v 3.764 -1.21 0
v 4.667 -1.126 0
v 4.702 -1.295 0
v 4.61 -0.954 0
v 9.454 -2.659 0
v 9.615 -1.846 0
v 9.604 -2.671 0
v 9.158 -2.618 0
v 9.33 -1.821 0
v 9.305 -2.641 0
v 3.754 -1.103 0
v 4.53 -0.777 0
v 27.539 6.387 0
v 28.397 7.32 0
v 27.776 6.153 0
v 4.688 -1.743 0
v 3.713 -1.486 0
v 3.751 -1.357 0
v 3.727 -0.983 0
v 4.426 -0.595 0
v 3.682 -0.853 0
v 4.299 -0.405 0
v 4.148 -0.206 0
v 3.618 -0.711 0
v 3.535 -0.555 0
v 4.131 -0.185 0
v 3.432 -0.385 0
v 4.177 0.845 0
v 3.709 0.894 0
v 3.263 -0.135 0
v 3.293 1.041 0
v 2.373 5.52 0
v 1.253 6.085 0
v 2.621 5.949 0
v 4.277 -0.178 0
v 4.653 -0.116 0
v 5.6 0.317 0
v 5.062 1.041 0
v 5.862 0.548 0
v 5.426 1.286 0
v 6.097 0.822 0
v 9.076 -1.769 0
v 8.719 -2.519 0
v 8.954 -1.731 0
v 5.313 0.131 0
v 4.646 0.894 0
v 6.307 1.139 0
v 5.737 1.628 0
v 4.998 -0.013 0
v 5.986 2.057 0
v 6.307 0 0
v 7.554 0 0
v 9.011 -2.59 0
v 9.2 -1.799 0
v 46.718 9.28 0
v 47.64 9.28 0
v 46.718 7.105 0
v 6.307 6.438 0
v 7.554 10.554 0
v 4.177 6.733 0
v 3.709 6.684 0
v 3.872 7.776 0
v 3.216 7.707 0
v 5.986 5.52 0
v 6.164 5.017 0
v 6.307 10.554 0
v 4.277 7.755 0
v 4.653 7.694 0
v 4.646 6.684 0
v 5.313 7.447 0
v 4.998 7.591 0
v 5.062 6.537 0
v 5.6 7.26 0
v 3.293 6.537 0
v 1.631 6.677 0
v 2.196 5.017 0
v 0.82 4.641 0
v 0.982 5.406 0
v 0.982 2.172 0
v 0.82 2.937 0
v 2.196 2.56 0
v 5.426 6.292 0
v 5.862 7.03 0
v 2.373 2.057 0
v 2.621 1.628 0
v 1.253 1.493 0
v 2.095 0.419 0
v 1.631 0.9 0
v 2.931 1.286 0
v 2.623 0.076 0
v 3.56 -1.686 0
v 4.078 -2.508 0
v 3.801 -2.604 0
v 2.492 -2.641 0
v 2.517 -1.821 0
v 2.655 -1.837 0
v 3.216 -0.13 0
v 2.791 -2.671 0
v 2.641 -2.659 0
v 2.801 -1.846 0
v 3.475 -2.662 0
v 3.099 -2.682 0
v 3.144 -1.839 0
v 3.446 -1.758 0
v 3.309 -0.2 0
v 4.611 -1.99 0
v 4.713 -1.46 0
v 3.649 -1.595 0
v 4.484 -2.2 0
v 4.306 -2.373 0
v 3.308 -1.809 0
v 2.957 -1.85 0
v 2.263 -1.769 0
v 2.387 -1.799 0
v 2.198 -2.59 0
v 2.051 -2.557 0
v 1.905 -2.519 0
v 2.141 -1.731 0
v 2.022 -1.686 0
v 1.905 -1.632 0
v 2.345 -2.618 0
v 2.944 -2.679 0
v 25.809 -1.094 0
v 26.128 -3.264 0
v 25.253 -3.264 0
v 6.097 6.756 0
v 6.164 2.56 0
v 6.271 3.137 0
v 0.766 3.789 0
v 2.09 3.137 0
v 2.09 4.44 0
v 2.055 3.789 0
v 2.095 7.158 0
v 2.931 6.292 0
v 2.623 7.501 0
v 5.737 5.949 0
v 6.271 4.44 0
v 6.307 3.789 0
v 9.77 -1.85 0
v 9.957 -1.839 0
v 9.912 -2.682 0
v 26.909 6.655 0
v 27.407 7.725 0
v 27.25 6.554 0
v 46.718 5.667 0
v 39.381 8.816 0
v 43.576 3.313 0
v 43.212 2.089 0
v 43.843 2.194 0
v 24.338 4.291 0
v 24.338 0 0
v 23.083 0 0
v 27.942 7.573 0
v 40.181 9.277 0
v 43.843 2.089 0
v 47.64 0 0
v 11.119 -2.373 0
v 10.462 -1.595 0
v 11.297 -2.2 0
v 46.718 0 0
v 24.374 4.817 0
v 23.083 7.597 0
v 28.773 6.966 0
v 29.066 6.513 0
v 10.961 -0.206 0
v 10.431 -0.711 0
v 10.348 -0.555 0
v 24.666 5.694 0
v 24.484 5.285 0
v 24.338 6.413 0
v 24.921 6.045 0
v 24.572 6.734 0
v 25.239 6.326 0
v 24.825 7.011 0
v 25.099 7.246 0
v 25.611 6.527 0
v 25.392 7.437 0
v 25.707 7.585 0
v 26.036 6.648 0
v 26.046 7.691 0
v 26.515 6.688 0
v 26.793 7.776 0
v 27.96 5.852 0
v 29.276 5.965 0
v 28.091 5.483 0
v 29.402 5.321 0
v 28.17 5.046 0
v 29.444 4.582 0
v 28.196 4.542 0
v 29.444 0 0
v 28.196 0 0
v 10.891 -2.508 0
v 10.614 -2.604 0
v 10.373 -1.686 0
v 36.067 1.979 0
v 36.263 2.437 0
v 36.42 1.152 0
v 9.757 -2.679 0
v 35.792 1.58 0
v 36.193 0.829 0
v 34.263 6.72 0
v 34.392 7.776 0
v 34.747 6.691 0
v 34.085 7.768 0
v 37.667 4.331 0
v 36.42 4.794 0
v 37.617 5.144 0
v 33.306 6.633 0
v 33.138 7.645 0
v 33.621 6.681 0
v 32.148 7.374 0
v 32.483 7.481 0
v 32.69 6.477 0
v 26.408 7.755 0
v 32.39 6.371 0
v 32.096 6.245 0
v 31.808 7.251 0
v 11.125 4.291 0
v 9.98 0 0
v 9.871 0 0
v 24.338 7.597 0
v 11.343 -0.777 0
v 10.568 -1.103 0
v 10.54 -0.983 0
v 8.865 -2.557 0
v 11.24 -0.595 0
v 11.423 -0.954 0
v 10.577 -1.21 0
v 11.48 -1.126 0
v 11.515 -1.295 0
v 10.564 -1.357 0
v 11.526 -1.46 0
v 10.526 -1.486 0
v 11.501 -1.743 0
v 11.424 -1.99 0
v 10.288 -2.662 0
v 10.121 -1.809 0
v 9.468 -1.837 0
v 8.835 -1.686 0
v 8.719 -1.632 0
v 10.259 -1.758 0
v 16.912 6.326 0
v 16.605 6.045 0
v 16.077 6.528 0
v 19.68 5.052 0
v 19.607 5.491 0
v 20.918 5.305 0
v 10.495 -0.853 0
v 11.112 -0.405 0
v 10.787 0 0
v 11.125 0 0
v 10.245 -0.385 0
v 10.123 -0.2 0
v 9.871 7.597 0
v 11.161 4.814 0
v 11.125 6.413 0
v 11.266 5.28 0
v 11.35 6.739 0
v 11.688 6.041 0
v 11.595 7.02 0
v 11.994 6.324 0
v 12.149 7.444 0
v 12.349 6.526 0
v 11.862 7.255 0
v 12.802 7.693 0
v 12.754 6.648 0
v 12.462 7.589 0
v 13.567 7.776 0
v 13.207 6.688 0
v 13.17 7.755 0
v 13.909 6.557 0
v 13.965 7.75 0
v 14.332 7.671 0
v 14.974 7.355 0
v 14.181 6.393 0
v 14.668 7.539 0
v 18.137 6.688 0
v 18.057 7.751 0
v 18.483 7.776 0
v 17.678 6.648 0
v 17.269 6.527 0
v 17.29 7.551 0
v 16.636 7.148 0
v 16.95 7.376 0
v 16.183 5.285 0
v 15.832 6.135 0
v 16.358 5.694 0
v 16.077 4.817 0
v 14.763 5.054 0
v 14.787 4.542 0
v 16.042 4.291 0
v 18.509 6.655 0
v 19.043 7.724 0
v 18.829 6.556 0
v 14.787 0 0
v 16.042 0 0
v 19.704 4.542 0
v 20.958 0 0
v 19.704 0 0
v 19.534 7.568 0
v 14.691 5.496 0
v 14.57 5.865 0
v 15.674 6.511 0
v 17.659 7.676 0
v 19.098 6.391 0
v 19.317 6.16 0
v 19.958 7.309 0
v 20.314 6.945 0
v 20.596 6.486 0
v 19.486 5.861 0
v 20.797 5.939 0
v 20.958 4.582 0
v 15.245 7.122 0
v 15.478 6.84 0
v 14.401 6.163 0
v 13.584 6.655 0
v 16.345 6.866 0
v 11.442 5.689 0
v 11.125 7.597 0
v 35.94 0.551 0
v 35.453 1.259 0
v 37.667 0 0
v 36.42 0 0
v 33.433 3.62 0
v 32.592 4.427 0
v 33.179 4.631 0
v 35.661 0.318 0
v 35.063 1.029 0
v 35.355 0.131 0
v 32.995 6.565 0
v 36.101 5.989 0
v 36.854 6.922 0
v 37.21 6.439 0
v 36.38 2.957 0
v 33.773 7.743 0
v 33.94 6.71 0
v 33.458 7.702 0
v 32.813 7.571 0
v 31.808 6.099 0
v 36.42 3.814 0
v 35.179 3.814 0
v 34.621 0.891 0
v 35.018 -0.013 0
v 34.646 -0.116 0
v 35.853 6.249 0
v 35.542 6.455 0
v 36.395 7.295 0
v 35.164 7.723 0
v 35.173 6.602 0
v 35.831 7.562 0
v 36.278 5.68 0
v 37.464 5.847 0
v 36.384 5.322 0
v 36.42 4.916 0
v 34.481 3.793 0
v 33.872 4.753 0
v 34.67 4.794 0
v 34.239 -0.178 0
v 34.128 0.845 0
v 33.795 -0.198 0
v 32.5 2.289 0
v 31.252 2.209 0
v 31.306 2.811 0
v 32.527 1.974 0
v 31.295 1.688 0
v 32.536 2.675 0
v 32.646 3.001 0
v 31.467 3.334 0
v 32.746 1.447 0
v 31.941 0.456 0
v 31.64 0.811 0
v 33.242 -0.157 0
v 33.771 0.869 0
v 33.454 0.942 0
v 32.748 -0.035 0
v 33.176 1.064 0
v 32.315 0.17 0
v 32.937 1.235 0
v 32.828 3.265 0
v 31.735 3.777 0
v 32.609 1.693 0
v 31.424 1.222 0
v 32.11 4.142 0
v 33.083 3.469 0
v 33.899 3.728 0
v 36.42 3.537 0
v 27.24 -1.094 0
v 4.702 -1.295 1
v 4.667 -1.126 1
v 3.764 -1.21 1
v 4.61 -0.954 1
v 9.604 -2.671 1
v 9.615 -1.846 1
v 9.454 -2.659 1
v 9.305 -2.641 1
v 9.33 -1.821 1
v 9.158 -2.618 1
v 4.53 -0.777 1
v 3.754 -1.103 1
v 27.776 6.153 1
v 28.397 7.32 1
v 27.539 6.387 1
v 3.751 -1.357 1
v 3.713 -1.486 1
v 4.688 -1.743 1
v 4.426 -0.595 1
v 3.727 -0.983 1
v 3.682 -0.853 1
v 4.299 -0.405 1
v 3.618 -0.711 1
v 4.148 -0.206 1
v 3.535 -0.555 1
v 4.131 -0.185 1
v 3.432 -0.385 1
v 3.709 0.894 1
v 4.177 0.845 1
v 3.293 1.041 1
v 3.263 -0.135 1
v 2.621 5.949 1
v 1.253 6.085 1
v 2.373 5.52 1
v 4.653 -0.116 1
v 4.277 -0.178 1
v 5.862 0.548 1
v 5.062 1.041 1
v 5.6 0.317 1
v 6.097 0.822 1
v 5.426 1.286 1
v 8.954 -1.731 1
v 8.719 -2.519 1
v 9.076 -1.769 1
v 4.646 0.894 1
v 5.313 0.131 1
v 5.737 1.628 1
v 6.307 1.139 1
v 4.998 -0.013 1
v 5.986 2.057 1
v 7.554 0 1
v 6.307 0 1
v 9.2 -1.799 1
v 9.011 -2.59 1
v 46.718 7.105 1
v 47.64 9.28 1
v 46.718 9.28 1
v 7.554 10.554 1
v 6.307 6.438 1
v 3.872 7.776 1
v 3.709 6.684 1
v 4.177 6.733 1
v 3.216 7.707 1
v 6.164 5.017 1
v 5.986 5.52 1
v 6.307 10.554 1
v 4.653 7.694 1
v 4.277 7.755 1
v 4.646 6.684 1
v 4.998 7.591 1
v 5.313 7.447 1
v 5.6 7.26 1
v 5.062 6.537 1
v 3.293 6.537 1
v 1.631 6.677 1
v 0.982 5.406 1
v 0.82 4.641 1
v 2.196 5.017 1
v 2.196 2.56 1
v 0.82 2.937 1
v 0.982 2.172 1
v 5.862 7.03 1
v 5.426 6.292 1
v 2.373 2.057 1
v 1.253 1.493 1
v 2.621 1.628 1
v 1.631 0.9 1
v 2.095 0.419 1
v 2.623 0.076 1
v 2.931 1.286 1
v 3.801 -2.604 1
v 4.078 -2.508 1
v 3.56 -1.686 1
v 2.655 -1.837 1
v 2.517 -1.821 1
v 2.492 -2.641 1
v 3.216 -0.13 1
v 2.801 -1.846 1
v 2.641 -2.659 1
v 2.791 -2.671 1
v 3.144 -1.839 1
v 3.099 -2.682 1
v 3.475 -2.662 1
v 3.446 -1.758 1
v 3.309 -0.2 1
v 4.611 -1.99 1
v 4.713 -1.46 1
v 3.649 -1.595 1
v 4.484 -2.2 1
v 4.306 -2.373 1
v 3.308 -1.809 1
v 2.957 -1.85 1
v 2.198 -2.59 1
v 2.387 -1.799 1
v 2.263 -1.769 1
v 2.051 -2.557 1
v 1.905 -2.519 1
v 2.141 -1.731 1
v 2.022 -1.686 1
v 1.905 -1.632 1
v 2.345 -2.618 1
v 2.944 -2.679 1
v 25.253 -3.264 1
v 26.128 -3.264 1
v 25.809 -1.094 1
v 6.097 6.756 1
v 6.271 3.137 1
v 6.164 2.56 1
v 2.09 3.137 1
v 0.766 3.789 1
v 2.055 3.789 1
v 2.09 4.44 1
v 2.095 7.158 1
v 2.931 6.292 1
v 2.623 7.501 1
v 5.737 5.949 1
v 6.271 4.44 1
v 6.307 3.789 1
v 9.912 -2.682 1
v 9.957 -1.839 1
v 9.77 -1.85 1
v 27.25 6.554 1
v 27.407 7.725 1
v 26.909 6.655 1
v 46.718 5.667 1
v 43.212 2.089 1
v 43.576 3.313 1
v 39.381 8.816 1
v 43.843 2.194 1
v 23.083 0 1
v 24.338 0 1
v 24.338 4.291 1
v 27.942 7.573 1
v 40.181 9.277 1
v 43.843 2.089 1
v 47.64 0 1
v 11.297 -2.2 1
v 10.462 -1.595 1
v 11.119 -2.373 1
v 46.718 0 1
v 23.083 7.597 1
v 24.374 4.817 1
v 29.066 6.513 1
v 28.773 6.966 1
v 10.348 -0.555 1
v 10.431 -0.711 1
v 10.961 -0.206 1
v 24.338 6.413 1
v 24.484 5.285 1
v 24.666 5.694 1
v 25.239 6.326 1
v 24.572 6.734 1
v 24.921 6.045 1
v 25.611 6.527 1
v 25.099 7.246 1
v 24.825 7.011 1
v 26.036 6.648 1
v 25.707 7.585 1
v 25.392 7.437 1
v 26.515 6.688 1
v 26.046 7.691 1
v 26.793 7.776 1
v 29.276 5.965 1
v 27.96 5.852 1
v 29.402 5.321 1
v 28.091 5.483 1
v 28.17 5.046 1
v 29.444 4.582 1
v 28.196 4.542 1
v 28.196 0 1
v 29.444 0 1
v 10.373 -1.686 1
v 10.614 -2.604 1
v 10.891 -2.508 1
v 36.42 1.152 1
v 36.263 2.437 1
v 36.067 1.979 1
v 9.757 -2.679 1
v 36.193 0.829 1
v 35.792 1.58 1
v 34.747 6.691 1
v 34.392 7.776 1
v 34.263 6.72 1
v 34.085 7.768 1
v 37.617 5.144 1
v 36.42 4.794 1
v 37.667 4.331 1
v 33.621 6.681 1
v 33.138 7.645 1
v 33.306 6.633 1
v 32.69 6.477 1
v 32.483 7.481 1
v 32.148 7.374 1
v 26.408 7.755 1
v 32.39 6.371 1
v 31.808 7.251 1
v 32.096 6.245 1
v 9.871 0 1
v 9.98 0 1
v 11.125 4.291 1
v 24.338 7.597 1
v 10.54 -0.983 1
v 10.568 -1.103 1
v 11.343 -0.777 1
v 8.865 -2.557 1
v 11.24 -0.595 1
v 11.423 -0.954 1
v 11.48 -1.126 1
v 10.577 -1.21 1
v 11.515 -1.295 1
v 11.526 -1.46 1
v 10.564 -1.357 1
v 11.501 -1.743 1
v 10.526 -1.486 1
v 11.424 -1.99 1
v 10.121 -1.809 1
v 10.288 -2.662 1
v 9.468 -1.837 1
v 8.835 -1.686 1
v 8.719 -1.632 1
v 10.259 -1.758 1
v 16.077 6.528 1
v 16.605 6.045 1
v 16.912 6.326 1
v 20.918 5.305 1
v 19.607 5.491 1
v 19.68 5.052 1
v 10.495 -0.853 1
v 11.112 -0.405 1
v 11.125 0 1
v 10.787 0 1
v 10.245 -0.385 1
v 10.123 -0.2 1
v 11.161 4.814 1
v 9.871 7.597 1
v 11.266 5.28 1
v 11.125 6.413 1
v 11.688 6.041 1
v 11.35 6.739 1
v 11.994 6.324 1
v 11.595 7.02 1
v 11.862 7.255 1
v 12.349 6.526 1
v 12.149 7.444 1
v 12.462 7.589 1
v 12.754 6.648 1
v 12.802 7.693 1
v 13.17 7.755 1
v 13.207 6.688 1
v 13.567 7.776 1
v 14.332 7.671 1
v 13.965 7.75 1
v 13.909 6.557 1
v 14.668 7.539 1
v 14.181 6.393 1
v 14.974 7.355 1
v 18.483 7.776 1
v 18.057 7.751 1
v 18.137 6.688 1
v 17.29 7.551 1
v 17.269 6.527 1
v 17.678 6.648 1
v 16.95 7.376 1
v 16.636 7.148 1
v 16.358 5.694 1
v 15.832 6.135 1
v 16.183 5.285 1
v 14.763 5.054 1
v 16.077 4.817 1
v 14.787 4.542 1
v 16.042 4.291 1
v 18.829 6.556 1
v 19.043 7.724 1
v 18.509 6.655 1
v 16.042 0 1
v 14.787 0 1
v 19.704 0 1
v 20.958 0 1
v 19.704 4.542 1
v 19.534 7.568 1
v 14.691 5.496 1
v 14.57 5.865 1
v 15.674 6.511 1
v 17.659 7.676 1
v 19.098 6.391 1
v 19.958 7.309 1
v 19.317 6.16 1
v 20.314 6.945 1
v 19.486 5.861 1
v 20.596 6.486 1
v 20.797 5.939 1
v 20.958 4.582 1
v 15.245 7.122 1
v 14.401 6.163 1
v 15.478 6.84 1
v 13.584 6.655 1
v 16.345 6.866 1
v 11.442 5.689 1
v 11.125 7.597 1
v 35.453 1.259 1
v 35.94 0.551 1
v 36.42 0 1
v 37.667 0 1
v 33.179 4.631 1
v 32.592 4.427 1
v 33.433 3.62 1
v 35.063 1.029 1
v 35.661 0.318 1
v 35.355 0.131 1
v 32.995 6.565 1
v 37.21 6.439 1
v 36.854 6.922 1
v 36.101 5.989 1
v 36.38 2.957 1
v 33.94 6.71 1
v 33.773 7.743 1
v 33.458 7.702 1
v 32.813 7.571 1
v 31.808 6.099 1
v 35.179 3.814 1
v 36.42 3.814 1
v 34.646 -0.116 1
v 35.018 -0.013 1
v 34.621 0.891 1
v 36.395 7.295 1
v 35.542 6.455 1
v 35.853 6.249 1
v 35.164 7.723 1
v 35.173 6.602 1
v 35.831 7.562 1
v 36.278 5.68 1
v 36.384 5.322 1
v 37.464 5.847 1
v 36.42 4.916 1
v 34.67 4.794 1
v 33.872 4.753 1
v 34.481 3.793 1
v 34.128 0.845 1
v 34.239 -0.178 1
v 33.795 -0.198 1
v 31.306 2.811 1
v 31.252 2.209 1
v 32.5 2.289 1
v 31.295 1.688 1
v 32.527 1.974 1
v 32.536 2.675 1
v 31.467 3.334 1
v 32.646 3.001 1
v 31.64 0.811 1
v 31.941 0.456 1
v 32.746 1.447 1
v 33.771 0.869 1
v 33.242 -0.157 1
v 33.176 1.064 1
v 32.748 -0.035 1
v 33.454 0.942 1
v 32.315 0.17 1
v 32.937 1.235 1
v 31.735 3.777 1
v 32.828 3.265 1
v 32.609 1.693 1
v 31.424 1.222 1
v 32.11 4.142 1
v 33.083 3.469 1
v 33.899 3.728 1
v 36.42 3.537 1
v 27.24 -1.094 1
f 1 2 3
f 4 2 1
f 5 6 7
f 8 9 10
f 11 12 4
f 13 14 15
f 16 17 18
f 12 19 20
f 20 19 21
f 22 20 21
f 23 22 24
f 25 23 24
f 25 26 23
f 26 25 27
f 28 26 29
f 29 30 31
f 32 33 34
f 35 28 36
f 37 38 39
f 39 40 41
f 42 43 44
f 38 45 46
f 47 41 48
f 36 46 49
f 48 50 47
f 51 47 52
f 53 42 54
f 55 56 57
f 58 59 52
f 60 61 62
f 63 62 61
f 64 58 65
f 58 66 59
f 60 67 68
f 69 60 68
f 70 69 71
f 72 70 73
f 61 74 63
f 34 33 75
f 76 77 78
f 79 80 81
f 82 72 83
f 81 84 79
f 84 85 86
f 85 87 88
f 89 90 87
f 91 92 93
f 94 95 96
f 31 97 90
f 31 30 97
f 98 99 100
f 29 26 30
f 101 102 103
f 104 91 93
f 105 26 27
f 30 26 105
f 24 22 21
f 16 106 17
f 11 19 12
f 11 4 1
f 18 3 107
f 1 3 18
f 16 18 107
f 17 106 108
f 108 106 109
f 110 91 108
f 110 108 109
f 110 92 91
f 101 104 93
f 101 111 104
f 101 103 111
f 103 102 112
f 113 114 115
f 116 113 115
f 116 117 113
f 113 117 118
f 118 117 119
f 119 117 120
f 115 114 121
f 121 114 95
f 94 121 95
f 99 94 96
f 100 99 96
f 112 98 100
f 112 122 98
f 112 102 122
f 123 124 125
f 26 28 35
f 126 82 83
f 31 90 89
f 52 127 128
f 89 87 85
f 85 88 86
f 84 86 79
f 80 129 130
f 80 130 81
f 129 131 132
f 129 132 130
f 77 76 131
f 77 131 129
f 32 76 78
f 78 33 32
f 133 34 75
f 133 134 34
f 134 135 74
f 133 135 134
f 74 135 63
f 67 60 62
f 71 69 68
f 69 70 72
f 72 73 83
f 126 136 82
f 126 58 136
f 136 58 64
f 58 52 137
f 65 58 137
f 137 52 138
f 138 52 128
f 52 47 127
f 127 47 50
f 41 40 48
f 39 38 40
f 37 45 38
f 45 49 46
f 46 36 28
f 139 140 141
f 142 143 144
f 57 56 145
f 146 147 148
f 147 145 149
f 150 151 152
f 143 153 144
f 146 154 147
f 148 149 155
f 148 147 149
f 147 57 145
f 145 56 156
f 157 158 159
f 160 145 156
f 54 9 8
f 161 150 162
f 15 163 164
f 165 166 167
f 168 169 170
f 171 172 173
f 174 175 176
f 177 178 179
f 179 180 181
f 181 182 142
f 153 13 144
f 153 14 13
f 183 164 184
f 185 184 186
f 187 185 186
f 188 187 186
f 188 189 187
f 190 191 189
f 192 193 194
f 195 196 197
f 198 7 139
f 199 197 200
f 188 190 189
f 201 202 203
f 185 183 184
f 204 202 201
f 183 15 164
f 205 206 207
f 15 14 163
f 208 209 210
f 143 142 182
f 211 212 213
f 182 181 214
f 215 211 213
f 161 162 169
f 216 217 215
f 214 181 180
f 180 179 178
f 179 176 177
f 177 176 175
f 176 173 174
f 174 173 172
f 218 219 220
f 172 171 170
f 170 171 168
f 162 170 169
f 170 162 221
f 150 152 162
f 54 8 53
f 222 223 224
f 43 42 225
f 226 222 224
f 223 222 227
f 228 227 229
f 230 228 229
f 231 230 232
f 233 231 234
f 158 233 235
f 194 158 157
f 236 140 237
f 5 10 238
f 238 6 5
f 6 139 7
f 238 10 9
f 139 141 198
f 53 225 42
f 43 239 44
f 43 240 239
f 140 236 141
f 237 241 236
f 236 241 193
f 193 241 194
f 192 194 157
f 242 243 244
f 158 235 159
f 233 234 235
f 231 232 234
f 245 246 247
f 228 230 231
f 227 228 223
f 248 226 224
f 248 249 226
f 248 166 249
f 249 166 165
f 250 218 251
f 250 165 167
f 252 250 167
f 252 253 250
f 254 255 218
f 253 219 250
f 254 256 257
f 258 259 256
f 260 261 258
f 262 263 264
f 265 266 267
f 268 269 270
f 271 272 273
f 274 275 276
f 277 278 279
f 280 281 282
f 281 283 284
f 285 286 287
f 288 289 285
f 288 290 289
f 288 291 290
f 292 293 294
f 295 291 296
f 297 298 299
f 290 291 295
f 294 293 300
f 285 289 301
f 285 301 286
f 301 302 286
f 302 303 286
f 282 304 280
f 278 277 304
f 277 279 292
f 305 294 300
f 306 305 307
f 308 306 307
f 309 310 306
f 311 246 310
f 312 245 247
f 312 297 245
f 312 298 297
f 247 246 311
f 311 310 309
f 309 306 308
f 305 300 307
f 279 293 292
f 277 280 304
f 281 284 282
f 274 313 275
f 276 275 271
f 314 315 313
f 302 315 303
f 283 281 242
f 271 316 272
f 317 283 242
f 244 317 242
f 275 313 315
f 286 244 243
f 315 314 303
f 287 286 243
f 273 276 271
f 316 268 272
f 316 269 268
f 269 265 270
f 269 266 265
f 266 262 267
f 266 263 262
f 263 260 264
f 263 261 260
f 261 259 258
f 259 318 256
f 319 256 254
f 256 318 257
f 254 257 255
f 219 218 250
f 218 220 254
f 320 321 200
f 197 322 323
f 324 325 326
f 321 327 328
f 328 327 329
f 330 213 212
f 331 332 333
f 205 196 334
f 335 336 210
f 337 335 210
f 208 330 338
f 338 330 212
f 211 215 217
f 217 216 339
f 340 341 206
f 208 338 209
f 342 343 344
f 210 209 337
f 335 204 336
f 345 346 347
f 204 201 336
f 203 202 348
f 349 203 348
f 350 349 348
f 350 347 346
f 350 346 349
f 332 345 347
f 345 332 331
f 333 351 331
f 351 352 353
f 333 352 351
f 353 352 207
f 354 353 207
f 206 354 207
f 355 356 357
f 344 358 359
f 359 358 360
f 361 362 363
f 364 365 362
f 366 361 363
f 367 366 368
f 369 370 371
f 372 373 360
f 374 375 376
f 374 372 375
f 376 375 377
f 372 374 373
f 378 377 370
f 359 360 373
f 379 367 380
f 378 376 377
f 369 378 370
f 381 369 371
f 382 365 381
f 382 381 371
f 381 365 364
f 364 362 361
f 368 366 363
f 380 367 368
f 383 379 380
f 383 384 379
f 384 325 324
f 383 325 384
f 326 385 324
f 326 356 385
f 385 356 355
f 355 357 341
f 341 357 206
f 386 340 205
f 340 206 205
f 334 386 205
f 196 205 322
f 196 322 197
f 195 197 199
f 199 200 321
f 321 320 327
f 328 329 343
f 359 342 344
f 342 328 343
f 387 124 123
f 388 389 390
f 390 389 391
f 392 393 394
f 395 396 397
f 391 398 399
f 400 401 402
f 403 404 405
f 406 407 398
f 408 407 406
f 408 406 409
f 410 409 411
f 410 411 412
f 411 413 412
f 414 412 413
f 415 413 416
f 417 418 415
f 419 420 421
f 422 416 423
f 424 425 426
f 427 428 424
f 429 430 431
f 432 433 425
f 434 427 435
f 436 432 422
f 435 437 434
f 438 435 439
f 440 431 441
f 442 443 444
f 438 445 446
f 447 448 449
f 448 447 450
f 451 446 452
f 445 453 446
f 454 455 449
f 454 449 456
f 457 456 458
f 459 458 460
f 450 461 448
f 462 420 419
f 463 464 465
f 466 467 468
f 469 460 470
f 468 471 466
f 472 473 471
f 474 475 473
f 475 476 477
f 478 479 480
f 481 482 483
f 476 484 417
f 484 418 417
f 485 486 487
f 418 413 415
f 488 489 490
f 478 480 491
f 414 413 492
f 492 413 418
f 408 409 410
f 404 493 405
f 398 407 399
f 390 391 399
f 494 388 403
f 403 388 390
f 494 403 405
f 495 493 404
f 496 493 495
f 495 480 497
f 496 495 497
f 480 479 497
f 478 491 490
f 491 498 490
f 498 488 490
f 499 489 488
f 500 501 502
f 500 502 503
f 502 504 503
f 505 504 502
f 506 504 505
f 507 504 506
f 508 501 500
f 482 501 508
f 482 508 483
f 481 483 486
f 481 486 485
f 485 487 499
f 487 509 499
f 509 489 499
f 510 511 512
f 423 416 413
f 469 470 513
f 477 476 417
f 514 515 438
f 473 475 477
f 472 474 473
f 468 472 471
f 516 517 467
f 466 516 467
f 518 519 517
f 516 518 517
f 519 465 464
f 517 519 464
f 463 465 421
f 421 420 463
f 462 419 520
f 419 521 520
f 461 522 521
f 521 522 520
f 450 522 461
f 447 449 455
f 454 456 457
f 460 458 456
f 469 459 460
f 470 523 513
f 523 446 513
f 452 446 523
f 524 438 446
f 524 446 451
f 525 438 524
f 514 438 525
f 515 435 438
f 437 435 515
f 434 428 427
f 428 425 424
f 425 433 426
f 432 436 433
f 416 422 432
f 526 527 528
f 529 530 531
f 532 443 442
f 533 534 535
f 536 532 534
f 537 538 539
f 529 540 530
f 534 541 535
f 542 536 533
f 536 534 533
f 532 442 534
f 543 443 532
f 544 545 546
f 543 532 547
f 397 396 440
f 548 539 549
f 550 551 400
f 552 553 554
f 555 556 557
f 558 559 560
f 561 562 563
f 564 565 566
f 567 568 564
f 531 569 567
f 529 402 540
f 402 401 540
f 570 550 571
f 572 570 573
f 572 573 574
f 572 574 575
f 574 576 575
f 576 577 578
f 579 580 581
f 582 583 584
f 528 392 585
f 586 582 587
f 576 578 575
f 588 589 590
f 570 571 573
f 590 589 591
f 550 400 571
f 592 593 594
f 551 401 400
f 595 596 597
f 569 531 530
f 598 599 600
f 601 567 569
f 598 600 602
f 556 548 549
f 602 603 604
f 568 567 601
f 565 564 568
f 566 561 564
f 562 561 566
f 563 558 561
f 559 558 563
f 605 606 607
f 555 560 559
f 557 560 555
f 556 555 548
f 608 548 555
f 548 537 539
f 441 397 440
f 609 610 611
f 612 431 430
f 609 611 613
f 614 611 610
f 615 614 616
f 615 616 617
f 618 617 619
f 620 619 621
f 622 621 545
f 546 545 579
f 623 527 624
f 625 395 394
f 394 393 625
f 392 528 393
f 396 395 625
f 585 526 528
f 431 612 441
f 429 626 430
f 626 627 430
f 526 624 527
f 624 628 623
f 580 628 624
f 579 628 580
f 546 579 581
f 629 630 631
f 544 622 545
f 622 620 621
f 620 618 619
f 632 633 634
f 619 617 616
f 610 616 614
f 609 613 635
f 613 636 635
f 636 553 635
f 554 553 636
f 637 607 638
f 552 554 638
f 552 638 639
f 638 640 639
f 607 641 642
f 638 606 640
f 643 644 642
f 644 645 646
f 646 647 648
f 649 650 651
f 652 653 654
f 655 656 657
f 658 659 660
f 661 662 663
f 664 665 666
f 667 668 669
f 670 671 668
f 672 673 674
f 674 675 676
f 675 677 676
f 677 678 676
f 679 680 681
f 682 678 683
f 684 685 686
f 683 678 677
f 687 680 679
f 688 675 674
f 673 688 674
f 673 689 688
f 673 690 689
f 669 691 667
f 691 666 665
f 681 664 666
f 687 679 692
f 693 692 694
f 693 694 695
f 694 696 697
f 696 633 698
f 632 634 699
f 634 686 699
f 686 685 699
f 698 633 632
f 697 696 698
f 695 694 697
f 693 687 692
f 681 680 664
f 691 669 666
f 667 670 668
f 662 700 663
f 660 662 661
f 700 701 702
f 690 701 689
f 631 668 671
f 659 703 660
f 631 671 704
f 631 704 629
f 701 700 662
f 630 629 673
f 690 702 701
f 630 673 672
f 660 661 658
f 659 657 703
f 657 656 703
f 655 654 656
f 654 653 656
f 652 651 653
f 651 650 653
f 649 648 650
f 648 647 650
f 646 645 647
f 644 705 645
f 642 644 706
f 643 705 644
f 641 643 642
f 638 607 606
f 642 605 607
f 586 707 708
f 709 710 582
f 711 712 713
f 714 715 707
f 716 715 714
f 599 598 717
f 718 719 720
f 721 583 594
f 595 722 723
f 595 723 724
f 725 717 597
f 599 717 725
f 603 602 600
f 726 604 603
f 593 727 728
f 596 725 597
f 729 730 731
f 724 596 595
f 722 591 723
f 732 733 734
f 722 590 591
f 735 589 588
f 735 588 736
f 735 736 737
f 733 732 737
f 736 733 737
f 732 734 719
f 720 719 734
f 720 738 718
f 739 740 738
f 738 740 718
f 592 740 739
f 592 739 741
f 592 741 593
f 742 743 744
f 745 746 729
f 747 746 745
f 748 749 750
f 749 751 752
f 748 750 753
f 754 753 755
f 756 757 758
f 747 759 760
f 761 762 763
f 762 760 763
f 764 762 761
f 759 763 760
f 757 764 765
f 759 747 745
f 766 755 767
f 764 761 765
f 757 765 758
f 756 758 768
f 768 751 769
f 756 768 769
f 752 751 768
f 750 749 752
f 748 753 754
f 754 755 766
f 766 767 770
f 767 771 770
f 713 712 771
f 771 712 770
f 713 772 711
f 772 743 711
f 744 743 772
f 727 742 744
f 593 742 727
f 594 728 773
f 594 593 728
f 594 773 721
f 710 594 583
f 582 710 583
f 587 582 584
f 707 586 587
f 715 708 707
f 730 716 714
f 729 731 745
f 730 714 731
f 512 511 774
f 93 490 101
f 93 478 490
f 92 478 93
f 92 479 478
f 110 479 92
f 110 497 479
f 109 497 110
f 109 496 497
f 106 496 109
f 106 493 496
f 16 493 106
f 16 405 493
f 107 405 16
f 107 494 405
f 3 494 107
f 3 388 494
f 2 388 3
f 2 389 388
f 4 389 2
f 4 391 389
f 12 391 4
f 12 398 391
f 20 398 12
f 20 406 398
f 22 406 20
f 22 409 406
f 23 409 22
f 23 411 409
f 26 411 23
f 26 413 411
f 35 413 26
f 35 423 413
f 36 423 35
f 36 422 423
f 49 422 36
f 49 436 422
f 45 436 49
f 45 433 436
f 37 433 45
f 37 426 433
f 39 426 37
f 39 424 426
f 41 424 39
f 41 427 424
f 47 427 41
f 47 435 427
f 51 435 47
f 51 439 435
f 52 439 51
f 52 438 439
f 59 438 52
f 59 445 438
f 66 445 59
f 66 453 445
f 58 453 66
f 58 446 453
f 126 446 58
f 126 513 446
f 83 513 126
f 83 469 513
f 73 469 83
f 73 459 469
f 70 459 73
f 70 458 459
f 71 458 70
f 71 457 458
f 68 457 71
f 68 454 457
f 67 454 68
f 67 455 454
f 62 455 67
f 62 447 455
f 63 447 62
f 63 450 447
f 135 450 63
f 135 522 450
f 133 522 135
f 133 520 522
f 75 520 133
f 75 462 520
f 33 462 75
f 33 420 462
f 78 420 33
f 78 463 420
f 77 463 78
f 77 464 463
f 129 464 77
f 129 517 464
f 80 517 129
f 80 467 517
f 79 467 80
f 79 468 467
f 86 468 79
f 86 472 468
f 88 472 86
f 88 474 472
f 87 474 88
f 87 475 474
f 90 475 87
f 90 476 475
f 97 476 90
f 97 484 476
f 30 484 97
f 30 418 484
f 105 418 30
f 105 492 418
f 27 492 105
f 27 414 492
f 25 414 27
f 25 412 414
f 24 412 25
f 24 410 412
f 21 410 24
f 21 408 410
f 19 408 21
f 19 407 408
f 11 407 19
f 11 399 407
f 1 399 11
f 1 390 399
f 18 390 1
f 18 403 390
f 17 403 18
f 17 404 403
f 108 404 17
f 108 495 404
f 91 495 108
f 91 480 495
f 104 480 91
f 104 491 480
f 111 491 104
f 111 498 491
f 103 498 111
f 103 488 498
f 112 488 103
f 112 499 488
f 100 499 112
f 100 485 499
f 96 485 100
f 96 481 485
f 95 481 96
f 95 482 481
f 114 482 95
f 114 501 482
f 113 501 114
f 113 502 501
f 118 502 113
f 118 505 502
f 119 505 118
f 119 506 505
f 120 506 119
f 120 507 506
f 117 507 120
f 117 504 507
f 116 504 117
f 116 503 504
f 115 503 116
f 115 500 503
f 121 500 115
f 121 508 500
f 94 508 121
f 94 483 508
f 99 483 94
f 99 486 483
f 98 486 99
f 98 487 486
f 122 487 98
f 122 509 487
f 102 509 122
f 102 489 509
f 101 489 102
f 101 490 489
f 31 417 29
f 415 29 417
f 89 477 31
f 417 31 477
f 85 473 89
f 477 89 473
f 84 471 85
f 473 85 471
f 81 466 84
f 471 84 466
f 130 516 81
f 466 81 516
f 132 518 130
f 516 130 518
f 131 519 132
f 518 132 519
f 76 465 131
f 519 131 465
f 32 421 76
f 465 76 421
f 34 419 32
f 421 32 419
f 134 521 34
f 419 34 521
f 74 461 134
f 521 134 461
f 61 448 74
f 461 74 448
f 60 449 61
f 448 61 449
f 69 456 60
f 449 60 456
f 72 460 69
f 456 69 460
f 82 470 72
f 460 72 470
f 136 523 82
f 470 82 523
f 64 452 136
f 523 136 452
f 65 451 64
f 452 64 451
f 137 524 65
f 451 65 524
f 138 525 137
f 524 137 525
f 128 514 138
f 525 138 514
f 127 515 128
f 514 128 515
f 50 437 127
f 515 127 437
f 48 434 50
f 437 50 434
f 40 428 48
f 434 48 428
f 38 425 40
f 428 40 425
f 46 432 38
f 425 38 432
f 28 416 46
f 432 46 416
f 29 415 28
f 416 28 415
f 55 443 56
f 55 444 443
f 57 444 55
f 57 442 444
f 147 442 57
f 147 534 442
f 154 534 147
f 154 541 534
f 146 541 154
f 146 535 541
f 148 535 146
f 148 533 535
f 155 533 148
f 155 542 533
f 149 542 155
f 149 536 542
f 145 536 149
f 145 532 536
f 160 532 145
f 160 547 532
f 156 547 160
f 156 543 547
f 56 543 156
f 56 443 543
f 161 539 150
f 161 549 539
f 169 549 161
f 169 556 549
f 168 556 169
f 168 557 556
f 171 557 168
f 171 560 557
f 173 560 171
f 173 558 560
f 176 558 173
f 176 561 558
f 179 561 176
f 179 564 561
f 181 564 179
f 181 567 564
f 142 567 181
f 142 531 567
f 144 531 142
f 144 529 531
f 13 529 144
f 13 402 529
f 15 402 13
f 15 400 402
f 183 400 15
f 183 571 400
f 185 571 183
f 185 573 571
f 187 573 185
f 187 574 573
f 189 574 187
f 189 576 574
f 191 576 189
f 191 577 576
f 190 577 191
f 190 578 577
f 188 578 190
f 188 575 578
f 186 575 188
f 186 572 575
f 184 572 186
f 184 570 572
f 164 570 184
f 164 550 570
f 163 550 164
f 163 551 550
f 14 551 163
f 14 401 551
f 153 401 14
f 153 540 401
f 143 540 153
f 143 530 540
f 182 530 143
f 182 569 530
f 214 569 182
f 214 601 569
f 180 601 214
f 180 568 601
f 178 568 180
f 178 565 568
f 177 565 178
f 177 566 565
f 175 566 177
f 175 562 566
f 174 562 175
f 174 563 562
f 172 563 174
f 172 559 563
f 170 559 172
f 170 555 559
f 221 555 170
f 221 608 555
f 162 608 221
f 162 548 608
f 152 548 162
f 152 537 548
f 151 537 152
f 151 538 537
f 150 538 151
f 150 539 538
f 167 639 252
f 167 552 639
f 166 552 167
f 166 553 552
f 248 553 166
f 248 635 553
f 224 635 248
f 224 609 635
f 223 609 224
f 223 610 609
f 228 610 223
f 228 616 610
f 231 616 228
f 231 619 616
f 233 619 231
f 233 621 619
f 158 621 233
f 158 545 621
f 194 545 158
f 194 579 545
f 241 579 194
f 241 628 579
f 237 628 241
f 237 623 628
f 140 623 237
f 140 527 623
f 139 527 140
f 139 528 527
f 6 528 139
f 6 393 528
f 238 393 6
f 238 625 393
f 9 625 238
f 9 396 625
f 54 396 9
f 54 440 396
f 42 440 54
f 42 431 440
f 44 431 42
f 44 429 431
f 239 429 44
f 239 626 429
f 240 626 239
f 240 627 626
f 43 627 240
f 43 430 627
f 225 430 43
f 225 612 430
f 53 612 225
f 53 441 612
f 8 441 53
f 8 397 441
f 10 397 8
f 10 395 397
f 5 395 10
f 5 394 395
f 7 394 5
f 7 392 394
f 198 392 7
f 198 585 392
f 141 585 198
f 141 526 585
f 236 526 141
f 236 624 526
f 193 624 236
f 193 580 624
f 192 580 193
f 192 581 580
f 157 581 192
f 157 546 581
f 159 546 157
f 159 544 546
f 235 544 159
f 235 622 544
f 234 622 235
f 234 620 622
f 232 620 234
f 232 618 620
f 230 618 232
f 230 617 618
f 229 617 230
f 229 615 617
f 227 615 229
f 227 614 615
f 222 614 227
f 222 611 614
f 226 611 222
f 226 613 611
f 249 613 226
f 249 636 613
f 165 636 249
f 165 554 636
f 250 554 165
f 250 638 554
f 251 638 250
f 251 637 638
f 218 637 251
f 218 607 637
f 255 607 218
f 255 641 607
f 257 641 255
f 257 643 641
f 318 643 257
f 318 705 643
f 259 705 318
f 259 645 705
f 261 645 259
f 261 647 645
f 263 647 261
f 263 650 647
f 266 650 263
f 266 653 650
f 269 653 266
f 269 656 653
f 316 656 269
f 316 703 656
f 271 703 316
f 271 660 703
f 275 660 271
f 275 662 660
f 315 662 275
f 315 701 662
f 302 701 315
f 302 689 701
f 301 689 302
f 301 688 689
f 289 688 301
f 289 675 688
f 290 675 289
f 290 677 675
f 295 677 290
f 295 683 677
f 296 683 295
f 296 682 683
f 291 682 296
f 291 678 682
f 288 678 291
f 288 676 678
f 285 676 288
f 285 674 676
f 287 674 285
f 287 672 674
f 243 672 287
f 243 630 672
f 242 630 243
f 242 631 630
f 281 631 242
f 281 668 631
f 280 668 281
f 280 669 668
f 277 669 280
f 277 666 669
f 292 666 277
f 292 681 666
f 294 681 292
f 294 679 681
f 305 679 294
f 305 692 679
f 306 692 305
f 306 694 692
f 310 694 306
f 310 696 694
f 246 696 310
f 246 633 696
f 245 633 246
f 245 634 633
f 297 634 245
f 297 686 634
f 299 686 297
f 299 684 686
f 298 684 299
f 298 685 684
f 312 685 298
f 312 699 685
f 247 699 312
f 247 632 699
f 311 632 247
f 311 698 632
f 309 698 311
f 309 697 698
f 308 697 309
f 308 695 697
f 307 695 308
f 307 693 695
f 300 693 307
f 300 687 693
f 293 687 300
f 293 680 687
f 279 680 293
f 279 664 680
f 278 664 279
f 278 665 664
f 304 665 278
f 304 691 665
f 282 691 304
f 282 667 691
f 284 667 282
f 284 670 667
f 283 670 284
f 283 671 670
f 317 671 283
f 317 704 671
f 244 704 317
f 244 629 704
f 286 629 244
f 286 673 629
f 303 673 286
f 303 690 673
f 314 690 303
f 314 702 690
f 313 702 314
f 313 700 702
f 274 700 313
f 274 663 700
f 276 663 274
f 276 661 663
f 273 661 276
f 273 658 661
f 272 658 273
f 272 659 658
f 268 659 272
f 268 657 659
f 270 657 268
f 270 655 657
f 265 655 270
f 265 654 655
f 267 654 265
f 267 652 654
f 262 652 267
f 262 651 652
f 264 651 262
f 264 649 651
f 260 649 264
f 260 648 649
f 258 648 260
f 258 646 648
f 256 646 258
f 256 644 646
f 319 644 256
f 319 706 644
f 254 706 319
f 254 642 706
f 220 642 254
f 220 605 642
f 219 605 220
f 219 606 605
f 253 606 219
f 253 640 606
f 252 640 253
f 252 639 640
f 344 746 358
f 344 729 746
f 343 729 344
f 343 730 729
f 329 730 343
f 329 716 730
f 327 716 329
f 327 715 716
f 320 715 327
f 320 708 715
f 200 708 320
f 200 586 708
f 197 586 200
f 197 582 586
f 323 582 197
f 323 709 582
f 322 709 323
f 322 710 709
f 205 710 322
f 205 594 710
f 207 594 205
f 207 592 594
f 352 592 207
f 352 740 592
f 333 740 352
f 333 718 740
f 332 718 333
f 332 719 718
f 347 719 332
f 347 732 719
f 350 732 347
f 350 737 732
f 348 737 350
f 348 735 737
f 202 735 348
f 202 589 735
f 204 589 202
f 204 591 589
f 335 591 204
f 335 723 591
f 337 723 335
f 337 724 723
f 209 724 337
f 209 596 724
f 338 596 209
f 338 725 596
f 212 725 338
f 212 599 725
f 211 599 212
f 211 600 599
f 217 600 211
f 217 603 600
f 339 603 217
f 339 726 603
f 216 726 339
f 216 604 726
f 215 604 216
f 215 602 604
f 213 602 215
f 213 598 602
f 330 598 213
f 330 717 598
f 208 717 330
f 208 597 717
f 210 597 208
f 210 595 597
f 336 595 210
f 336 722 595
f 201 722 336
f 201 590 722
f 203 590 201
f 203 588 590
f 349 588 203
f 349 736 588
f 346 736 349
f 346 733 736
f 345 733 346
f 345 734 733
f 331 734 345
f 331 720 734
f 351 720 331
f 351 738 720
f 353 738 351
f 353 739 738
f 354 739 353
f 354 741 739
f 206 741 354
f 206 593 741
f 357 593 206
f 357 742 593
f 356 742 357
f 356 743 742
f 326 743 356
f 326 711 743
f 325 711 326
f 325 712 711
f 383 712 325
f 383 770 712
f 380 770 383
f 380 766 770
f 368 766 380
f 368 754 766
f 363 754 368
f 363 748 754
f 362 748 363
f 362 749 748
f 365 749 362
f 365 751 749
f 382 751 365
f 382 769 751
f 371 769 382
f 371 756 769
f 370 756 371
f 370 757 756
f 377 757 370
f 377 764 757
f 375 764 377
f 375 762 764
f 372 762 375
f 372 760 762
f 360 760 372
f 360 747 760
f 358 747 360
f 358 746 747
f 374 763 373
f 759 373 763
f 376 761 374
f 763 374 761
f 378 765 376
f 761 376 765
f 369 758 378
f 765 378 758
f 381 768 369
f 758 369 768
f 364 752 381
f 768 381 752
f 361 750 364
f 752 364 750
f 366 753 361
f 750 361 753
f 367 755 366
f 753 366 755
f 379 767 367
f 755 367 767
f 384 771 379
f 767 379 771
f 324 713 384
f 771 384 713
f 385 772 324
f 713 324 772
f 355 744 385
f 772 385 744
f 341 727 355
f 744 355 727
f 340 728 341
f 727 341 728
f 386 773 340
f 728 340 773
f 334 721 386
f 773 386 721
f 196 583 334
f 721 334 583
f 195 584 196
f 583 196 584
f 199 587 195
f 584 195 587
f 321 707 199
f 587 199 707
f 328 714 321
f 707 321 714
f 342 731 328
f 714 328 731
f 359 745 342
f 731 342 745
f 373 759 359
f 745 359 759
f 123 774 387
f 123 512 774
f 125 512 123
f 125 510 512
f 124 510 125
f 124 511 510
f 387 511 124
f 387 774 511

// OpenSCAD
linear_extrude(height=1,slices=1) {
    text("d\u0327m\u0327n\u0327a\u02E5\u02E8\u02E6",
        size=10,
        lang="LIV",
        font="DejaVu Sans");
}
